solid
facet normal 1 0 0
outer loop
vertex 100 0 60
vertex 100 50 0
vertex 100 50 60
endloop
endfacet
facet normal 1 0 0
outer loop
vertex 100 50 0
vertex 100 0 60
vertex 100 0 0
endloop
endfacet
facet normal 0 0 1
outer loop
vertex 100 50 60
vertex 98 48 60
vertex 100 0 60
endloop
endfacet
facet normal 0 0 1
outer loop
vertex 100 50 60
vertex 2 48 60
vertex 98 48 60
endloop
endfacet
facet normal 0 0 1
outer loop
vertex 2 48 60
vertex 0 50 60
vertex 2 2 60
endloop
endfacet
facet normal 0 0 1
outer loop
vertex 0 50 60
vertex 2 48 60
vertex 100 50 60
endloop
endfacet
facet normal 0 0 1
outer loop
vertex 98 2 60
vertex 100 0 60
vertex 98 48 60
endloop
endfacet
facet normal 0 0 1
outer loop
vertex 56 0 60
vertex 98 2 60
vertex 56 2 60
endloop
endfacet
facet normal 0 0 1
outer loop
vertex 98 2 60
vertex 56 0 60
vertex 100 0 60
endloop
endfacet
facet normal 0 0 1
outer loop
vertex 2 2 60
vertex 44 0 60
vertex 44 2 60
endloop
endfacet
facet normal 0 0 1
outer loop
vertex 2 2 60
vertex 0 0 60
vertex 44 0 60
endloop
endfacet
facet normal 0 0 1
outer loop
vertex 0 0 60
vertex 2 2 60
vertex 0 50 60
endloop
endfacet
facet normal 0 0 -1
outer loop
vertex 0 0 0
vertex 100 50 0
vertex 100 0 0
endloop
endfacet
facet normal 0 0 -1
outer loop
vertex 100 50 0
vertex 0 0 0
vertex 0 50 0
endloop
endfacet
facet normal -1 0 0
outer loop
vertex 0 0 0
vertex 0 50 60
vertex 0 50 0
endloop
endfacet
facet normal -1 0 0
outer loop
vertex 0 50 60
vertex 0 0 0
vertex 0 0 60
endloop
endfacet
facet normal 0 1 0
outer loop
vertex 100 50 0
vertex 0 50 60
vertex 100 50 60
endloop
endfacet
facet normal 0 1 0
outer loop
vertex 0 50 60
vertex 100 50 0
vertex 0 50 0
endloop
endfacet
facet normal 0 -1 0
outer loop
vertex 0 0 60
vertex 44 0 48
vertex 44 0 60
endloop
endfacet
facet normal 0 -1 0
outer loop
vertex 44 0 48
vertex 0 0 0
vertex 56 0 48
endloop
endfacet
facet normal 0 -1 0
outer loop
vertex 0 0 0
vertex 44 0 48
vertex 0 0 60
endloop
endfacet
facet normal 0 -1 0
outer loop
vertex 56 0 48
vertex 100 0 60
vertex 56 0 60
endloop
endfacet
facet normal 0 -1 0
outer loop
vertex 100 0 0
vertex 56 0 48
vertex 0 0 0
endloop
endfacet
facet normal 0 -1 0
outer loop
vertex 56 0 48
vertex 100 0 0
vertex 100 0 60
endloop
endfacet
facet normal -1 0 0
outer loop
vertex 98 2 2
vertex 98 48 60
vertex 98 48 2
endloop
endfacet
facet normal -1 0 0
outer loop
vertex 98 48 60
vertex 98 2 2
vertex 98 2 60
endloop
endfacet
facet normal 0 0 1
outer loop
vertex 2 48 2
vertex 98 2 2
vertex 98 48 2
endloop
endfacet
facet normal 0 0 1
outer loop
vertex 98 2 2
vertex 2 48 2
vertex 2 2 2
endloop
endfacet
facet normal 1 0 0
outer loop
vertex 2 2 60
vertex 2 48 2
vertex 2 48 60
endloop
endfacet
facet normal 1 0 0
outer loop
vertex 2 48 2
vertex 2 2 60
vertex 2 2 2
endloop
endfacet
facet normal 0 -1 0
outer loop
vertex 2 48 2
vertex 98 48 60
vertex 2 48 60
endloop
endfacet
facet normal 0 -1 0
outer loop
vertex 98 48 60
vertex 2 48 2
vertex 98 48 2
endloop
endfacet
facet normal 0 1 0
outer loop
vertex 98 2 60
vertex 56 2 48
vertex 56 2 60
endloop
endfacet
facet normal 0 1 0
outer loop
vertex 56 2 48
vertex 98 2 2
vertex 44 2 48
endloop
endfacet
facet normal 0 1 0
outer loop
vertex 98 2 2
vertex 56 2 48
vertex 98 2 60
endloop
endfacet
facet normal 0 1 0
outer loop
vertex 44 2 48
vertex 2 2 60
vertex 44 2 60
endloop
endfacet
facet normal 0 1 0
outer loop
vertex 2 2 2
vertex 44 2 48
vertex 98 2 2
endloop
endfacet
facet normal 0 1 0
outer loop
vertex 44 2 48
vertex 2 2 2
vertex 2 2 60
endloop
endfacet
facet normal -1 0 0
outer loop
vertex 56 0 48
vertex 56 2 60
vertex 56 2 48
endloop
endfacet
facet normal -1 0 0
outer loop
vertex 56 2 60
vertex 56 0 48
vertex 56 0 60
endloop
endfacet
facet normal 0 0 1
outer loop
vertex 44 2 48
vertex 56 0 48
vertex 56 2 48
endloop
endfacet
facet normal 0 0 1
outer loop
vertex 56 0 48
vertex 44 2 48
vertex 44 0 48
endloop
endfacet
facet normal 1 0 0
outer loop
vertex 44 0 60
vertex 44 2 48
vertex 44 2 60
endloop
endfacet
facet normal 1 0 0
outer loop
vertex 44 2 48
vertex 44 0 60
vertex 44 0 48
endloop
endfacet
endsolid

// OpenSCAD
$fn = 32;

// ----------------------------------------------------------------------
// Enclosure box: notch enclosure
// ----------------------------------------------------------------------

// --- parameters (mm) ---
box_l = 100;              // outer length, X
box_w = 50;               // outer width, Y
box_h = 60;               // outer height
wall_t = 2;               // wall thickness
notch_w = 12;             // cable notch width
notch_h = 12;             // cable notch height
fit_tol = 0.1;            // tolerance for press fits, mm
free_tol = 0.3;           // tolerance for clearance fits, mm

inner_h = box_h - wall_t;  // cavity depth
boss_h = inner_h - 2;  // corner boss height

difference() {
  cube([box_l, box_w, box_h]);
  translate([wall_t, wall_t, wall_t])
    cube([box_l - 2 * wall_t, box_w - 2 * wall_t, box_h]);
  translate([box_l / 2 - notch_w / 2, -1, box_h - notch_h])
    cube([notch_w, wall_t + 2, notch_h + 1]);
}
